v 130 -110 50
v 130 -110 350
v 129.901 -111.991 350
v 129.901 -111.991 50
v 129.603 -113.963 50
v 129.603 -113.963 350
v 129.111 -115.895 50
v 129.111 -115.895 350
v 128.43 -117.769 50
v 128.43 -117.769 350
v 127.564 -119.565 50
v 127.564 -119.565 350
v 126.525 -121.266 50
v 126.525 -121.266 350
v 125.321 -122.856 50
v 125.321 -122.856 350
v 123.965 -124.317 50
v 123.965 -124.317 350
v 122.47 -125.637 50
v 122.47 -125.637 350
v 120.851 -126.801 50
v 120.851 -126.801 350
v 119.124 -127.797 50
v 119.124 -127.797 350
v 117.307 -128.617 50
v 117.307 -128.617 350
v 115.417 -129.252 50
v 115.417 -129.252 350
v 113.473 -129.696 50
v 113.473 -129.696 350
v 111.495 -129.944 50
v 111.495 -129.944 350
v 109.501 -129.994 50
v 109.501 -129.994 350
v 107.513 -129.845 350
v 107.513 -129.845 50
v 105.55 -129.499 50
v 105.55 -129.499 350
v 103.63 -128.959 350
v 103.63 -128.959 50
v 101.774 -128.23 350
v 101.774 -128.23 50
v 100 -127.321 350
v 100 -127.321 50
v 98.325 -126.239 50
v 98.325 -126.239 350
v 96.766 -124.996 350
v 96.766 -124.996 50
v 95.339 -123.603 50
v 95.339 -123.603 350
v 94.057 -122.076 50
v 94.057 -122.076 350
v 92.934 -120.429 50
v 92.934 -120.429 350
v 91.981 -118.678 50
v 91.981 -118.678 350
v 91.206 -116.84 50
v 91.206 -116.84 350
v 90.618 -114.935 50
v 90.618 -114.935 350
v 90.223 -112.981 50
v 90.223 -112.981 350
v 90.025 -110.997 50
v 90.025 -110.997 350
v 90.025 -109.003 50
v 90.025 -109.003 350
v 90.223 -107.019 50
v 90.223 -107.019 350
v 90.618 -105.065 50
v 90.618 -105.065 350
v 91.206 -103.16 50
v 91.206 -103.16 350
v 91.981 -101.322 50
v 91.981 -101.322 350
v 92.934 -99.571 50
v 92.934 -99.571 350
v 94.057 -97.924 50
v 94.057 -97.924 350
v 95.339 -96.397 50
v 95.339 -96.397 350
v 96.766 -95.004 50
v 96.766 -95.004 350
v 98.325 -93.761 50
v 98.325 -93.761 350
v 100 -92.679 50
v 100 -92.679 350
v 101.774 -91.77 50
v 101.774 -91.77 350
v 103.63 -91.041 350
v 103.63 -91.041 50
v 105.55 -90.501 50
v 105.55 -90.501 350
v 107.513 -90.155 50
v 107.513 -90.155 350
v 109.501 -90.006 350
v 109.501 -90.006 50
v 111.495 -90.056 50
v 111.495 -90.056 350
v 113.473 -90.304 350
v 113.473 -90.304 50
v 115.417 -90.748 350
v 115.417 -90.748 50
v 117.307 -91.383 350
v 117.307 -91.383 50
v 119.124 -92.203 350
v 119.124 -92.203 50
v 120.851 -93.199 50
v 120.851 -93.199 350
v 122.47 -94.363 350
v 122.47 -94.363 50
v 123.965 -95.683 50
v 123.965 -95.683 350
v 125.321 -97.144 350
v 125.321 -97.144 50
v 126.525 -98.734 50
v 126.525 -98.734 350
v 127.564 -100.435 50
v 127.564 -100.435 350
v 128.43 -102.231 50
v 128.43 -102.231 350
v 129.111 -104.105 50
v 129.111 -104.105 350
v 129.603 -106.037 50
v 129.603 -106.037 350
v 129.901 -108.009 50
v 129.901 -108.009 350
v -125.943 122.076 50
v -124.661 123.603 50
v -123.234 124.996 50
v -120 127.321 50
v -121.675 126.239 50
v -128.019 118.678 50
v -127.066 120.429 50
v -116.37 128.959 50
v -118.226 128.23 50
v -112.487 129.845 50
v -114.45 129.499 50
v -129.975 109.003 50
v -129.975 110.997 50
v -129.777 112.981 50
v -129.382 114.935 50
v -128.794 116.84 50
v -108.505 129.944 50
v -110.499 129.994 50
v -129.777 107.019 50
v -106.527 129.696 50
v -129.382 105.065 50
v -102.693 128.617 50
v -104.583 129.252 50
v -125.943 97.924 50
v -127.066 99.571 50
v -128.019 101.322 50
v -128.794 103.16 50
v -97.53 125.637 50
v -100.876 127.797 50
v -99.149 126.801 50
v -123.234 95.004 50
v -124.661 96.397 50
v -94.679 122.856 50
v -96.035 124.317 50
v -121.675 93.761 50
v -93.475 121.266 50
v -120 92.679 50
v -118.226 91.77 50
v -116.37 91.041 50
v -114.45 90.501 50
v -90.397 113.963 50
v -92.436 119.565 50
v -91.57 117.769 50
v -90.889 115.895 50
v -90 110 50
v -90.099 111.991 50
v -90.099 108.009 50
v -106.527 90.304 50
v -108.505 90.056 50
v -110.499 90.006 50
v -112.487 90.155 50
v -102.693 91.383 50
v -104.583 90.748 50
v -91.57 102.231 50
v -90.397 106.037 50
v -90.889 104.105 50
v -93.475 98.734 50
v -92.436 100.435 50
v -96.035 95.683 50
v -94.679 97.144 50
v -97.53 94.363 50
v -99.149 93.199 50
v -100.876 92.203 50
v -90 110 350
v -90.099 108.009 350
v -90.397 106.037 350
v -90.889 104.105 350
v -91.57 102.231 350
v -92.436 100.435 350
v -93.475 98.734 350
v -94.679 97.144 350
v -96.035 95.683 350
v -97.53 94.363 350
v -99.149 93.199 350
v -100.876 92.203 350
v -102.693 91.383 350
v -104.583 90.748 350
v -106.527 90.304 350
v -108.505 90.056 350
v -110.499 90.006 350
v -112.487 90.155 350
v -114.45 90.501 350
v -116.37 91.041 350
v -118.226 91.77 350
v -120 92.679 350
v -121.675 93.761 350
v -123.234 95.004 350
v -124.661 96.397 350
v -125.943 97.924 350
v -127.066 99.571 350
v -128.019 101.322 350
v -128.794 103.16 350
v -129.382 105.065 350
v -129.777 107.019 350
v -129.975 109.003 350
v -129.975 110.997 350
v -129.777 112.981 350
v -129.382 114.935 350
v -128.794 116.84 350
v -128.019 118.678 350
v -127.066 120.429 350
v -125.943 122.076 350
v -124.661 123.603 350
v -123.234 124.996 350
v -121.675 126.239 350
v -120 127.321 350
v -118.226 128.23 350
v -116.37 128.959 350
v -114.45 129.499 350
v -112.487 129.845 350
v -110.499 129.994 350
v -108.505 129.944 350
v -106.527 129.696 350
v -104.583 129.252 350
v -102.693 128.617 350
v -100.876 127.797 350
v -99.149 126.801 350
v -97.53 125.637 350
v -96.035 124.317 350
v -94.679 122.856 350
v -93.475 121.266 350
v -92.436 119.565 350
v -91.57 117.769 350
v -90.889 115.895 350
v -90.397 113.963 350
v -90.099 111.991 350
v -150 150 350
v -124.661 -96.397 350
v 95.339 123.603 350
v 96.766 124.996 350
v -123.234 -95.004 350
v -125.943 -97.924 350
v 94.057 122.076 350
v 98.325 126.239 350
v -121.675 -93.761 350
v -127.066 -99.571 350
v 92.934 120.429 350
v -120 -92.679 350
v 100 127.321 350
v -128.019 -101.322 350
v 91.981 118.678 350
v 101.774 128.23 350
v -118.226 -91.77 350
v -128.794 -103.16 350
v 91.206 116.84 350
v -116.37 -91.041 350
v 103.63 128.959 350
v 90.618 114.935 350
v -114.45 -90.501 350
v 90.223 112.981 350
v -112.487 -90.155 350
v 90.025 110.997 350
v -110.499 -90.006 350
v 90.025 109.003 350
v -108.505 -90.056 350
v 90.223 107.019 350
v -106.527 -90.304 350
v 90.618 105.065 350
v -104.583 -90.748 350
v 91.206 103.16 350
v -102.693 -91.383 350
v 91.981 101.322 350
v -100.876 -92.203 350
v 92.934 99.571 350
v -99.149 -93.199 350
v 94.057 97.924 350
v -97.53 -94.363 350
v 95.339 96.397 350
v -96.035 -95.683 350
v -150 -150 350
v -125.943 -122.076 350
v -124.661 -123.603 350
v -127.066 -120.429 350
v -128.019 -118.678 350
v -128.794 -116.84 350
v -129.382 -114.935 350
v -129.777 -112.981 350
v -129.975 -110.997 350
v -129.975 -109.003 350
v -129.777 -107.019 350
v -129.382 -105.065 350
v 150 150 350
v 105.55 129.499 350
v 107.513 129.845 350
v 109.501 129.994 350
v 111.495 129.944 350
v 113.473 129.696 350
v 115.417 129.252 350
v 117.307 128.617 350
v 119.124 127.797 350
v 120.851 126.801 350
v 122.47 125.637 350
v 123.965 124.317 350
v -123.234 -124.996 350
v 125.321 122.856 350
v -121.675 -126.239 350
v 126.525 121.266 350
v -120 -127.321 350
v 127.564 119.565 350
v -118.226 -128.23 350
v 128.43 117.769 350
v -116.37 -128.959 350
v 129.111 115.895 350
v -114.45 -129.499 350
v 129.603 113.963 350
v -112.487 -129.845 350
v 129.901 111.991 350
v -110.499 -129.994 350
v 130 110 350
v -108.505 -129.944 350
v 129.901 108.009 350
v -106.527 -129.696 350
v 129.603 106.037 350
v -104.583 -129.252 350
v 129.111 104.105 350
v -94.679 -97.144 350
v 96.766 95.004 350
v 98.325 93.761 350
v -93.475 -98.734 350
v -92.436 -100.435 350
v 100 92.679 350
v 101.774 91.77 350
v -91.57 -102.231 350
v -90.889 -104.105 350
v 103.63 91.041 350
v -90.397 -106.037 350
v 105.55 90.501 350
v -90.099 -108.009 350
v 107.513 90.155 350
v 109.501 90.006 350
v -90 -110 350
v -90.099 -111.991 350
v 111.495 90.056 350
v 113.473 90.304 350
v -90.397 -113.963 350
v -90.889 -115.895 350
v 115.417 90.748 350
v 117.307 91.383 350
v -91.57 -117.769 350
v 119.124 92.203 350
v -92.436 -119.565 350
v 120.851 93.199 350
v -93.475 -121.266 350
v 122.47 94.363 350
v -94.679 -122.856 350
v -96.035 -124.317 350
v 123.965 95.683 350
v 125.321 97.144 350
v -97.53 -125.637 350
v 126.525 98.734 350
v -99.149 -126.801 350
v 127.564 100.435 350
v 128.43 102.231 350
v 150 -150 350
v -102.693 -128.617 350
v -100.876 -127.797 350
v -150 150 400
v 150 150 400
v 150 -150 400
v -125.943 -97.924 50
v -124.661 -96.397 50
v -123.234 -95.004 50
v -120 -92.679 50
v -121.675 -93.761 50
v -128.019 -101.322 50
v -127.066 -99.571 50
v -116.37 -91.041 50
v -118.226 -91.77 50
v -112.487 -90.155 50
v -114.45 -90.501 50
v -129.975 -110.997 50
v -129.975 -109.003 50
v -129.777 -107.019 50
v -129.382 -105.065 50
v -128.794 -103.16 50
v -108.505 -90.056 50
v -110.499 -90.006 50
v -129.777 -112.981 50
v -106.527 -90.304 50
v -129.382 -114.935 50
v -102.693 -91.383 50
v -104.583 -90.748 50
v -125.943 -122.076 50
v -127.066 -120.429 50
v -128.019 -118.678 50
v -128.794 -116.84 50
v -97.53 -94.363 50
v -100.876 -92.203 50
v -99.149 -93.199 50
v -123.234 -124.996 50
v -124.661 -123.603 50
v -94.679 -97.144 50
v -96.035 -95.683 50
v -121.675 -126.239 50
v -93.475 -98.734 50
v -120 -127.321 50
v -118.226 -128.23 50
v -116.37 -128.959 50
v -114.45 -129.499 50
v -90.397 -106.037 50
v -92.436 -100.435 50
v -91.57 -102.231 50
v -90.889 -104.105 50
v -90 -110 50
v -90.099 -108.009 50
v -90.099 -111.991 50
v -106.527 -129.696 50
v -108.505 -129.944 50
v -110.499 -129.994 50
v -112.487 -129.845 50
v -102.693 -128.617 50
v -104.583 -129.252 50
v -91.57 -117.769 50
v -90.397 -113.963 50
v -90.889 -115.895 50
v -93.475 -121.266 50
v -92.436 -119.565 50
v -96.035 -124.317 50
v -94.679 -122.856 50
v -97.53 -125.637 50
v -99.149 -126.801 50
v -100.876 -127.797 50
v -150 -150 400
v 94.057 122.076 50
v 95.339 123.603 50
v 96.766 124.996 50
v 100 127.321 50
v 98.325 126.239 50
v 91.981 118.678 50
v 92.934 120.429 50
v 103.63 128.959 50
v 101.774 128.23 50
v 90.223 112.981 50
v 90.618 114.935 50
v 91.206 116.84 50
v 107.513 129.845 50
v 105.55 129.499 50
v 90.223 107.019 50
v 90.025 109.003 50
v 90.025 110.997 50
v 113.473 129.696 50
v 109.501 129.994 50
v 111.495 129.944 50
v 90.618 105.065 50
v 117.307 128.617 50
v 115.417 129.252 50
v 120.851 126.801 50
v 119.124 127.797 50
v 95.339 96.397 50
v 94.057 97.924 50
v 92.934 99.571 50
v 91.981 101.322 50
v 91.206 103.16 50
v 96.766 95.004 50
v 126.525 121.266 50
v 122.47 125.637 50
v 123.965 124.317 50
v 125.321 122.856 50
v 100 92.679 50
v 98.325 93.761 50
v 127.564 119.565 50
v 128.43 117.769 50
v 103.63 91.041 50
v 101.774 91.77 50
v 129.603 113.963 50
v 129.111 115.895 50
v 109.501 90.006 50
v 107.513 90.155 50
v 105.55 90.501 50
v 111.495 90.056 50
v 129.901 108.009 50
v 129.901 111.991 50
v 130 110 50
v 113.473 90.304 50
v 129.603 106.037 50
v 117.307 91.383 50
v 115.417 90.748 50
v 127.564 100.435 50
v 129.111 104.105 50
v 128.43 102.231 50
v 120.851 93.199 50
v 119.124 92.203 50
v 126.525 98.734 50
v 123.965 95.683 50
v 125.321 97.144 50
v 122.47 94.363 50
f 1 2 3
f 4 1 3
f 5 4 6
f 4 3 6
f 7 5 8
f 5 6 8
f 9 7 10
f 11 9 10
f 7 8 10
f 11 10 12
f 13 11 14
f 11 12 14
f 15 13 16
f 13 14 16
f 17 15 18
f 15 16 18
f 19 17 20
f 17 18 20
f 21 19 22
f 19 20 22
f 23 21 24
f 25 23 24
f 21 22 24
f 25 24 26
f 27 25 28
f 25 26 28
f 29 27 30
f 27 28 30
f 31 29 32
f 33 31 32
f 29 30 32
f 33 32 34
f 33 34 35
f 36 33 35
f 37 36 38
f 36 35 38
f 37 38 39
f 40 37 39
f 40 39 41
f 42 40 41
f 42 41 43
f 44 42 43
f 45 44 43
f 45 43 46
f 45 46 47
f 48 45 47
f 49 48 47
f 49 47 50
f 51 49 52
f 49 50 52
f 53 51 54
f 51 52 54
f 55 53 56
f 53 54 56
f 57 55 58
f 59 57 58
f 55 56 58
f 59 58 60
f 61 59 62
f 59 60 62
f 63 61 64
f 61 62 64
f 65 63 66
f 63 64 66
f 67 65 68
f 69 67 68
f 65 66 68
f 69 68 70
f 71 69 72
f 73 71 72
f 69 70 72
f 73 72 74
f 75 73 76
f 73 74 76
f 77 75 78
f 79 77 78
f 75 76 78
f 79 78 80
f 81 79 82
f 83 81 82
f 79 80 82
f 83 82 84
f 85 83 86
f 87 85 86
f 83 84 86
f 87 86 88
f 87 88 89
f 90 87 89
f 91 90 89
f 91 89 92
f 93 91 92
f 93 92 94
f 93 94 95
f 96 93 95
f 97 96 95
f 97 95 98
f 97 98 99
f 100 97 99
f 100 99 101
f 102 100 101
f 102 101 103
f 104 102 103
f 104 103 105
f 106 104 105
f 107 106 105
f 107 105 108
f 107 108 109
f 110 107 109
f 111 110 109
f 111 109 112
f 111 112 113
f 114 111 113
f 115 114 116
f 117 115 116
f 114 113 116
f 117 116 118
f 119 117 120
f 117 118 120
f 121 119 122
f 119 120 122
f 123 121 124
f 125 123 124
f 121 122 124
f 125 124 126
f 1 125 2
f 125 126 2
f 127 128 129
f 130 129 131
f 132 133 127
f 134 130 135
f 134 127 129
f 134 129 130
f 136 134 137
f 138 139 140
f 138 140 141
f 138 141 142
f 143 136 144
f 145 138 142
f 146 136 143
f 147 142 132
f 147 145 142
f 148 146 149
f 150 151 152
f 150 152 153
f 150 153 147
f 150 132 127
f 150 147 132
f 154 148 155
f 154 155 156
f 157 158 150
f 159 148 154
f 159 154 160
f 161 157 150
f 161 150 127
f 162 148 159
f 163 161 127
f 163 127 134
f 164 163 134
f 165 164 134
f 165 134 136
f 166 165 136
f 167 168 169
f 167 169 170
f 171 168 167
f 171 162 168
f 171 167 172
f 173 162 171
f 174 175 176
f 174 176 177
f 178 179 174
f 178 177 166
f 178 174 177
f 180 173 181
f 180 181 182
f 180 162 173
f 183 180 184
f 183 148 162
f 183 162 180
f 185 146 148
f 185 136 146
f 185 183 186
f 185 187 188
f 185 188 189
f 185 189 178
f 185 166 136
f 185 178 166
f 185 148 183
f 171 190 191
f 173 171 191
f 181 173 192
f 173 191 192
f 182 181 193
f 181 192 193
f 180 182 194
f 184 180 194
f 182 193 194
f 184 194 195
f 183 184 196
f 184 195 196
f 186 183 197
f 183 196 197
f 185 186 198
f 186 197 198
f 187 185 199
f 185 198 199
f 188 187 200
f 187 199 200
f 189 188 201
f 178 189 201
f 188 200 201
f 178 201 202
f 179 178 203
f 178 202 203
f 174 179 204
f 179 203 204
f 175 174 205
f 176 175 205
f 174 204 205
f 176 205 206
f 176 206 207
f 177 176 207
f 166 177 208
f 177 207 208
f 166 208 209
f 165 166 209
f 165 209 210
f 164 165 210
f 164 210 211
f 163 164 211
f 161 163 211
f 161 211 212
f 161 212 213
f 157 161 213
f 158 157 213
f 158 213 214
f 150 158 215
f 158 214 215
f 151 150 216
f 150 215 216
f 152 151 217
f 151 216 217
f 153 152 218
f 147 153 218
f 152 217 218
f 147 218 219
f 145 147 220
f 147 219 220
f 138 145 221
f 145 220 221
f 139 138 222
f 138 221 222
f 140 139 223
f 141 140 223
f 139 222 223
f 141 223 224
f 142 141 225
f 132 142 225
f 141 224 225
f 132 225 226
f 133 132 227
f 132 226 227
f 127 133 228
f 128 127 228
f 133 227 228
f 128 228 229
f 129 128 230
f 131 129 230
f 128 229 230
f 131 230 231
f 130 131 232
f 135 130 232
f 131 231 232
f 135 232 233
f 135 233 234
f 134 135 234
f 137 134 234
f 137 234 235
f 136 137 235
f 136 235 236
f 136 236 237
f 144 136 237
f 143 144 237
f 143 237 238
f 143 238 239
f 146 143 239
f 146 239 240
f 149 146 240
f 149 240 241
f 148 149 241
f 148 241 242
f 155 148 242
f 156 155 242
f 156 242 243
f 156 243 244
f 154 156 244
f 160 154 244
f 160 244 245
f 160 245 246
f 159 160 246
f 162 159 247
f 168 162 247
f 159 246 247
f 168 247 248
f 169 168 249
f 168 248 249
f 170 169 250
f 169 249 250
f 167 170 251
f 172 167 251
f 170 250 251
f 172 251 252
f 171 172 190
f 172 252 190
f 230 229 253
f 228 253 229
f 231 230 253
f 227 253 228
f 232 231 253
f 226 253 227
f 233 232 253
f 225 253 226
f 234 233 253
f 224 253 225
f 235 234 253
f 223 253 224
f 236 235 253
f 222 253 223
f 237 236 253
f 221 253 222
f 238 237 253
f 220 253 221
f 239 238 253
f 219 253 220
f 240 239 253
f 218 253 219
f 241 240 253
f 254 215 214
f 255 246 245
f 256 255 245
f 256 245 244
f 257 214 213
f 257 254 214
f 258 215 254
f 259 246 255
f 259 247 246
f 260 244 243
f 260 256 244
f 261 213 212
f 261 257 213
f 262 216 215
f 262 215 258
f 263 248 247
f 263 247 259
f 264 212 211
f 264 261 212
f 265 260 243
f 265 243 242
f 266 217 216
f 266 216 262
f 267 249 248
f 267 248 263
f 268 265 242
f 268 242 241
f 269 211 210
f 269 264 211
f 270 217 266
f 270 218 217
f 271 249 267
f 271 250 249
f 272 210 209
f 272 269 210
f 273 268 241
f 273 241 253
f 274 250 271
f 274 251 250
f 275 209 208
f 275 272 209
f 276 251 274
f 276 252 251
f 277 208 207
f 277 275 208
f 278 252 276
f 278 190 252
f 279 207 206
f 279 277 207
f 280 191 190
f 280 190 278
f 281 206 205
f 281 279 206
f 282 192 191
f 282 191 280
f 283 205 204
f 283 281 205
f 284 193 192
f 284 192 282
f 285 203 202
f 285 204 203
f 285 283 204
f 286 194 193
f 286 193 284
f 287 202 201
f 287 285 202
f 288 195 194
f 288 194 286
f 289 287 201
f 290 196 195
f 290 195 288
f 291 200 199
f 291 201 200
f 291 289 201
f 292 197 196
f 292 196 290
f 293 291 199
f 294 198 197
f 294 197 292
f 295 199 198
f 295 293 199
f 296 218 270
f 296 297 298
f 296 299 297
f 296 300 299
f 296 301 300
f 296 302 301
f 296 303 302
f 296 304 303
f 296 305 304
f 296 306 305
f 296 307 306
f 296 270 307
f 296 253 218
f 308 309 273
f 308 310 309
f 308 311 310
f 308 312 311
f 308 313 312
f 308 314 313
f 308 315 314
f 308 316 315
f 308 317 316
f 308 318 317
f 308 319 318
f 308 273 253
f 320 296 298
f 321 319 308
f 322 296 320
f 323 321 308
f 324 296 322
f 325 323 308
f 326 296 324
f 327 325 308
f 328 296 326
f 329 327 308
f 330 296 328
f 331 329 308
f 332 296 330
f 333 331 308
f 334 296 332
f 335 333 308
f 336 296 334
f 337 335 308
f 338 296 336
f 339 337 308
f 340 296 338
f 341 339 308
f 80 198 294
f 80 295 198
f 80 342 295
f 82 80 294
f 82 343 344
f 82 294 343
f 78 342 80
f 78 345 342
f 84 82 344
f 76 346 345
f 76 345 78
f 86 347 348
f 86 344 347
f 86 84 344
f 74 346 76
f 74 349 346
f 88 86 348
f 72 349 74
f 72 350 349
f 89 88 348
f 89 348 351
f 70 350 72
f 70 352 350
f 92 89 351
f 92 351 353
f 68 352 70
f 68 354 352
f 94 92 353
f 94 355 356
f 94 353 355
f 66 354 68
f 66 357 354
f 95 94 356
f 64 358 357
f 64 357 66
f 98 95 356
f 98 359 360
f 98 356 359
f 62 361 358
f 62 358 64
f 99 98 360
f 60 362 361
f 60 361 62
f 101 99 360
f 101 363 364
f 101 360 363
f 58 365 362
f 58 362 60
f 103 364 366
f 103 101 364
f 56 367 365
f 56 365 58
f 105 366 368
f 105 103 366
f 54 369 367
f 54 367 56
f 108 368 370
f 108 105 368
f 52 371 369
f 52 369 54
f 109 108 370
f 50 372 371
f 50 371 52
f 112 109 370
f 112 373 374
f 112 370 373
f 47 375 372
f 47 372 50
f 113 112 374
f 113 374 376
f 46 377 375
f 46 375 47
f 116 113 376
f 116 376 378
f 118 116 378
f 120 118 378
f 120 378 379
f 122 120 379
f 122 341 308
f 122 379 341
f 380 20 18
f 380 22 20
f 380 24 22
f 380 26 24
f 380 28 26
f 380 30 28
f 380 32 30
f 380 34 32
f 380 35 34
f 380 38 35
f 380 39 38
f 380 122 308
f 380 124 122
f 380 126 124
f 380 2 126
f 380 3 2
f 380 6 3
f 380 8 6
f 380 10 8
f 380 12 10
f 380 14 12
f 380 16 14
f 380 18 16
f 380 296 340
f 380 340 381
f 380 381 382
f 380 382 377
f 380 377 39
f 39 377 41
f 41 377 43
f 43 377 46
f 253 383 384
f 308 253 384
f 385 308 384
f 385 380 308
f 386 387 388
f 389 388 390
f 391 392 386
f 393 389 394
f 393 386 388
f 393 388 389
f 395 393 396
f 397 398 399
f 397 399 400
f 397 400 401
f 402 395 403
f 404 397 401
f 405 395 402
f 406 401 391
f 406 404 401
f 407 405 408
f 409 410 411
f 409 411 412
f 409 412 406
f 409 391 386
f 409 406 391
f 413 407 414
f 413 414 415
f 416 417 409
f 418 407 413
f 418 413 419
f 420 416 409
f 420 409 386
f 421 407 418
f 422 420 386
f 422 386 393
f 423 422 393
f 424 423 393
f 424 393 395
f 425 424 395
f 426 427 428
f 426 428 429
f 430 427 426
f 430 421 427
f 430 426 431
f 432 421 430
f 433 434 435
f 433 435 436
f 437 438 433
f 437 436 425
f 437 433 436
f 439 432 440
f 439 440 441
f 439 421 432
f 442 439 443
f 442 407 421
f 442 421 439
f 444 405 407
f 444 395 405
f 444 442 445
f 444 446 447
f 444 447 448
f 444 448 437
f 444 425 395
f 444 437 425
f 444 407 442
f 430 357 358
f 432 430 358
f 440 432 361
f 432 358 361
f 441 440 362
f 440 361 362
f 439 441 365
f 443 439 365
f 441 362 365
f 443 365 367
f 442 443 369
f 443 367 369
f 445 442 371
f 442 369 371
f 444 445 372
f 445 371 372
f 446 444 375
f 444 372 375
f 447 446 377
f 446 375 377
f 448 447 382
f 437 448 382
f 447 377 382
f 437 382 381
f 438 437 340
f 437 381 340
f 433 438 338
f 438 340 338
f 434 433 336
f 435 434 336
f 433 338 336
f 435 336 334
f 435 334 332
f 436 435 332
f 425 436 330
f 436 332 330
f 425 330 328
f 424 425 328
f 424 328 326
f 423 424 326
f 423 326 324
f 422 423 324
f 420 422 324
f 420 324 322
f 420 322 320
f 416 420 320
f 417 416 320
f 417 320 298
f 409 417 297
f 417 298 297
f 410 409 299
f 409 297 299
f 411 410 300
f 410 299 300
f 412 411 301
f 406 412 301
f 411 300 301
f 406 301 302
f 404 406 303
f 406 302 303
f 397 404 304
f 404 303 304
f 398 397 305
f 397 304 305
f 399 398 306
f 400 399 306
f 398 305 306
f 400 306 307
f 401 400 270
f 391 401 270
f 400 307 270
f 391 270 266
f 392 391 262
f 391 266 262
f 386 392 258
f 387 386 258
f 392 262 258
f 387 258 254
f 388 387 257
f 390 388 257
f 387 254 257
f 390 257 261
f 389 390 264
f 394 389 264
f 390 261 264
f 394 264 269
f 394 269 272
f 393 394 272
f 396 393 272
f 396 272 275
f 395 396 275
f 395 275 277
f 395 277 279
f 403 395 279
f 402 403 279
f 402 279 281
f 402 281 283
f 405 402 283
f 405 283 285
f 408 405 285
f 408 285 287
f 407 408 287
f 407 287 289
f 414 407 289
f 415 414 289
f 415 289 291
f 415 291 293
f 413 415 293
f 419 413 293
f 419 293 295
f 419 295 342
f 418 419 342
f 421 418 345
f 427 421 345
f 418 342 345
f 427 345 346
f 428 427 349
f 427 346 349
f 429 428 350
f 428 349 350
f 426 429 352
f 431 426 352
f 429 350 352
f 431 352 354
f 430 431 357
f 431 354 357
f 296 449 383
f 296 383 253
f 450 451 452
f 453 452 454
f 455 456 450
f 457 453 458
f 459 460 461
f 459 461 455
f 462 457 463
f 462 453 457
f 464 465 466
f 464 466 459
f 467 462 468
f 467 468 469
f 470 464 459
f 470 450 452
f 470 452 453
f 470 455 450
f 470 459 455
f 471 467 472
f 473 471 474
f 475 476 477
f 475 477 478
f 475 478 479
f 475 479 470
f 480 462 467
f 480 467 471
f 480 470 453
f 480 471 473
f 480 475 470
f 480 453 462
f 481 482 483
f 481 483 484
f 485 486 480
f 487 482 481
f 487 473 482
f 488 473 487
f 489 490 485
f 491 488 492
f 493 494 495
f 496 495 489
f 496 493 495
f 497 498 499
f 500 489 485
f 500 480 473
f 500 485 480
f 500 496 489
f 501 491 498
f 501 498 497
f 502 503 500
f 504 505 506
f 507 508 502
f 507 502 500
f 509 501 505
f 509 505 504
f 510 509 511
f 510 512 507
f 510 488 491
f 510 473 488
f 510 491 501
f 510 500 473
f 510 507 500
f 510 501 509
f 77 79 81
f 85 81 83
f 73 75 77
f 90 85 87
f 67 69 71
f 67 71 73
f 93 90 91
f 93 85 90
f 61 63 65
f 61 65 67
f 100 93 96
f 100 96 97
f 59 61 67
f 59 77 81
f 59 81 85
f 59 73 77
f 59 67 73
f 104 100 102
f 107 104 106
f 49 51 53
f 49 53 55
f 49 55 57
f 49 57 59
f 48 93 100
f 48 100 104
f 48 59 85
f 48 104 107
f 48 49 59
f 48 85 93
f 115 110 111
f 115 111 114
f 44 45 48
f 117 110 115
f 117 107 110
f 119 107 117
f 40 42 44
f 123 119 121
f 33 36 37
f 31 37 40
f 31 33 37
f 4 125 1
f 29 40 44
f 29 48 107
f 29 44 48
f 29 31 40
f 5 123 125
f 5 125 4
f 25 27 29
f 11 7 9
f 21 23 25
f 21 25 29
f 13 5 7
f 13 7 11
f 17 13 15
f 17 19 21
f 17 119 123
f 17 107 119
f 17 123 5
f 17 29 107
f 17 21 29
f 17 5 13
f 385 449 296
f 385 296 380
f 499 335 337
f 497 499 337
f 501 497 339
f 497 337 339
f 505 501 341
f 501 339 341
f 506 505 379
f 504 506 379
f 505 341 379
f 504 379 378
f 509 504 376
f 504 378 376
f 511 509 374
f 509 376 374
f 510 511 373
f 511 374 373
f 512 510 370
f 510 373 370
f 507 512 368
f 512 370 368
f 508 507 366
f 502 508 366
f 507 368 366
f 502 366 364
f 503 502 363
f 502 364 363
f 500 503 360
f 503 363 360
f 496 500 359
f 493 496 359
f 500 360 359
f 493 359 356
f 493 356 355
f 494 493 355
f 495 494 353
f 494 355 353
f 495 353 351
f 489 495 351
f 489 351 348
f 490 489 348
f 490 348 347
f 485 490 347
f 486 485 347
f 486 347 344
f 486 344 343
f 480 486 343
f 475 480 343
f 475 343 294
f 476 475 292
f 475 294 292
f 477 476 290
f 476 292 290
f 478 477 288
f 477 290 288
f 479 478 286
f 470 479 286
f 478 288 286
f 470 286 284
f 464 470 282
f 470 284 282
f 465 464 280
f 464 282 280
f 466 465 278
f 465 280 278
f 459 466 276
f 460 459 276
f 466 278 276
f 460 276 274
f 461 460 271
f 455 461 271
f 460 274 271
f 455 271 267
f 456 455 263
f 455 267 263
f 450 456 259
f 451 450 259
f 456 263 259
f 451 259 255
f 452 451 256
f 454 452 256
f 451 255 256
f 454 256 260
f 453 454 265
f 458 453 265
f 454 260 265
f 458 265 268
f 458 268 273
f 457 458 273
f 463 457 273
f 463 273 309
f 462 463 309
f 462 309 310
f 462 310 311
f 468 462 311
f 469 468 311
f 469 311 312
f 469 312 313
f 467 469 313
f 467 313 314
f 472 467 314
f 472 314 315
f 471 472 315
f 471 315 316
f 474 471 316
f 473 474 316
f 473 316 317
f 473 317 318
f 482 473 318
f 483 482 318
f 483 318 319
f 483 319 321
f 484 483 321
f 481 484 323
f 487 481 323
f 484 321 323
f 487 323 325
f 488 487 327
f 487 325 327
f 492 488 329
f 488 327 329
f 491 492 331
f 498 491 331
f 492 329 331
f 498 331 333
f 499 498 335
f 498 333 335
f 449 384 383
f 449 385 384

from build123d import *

# Parameters (mm, degrees)
F1_DEPTH = 150
F2_R     = 20
F3_DEPTH = 300


with BuildPart() as f1:
    # F0 (on Front) → F1 (new body, symmetric)
    with BuildSketch(Plane.XZ):
        Polygon((150, 400), (-150, 400), (-150, 350), (-130, 350), (150, 350), align=None)
    extrude(amount=F1_DEPTH, both=True)

    # F2 (on face) → F3 (join)
    with BuildSketch(Plane(origin=(0, 0, 350), x_dir=(1, 0, 0), z_dir=(0, 0, -1))):
        with Locations((110, 110)):
            Circle(F2_R)
        with Locations((-110, 110)):
            Circle(F2_R)
        with Locations((-110, -110)):
            Circle(F2_R)
        with Locations((110, -110)):
            Circle(F2_R)
    extrude(amount=F3_DEPTH)


solid = f1.part
